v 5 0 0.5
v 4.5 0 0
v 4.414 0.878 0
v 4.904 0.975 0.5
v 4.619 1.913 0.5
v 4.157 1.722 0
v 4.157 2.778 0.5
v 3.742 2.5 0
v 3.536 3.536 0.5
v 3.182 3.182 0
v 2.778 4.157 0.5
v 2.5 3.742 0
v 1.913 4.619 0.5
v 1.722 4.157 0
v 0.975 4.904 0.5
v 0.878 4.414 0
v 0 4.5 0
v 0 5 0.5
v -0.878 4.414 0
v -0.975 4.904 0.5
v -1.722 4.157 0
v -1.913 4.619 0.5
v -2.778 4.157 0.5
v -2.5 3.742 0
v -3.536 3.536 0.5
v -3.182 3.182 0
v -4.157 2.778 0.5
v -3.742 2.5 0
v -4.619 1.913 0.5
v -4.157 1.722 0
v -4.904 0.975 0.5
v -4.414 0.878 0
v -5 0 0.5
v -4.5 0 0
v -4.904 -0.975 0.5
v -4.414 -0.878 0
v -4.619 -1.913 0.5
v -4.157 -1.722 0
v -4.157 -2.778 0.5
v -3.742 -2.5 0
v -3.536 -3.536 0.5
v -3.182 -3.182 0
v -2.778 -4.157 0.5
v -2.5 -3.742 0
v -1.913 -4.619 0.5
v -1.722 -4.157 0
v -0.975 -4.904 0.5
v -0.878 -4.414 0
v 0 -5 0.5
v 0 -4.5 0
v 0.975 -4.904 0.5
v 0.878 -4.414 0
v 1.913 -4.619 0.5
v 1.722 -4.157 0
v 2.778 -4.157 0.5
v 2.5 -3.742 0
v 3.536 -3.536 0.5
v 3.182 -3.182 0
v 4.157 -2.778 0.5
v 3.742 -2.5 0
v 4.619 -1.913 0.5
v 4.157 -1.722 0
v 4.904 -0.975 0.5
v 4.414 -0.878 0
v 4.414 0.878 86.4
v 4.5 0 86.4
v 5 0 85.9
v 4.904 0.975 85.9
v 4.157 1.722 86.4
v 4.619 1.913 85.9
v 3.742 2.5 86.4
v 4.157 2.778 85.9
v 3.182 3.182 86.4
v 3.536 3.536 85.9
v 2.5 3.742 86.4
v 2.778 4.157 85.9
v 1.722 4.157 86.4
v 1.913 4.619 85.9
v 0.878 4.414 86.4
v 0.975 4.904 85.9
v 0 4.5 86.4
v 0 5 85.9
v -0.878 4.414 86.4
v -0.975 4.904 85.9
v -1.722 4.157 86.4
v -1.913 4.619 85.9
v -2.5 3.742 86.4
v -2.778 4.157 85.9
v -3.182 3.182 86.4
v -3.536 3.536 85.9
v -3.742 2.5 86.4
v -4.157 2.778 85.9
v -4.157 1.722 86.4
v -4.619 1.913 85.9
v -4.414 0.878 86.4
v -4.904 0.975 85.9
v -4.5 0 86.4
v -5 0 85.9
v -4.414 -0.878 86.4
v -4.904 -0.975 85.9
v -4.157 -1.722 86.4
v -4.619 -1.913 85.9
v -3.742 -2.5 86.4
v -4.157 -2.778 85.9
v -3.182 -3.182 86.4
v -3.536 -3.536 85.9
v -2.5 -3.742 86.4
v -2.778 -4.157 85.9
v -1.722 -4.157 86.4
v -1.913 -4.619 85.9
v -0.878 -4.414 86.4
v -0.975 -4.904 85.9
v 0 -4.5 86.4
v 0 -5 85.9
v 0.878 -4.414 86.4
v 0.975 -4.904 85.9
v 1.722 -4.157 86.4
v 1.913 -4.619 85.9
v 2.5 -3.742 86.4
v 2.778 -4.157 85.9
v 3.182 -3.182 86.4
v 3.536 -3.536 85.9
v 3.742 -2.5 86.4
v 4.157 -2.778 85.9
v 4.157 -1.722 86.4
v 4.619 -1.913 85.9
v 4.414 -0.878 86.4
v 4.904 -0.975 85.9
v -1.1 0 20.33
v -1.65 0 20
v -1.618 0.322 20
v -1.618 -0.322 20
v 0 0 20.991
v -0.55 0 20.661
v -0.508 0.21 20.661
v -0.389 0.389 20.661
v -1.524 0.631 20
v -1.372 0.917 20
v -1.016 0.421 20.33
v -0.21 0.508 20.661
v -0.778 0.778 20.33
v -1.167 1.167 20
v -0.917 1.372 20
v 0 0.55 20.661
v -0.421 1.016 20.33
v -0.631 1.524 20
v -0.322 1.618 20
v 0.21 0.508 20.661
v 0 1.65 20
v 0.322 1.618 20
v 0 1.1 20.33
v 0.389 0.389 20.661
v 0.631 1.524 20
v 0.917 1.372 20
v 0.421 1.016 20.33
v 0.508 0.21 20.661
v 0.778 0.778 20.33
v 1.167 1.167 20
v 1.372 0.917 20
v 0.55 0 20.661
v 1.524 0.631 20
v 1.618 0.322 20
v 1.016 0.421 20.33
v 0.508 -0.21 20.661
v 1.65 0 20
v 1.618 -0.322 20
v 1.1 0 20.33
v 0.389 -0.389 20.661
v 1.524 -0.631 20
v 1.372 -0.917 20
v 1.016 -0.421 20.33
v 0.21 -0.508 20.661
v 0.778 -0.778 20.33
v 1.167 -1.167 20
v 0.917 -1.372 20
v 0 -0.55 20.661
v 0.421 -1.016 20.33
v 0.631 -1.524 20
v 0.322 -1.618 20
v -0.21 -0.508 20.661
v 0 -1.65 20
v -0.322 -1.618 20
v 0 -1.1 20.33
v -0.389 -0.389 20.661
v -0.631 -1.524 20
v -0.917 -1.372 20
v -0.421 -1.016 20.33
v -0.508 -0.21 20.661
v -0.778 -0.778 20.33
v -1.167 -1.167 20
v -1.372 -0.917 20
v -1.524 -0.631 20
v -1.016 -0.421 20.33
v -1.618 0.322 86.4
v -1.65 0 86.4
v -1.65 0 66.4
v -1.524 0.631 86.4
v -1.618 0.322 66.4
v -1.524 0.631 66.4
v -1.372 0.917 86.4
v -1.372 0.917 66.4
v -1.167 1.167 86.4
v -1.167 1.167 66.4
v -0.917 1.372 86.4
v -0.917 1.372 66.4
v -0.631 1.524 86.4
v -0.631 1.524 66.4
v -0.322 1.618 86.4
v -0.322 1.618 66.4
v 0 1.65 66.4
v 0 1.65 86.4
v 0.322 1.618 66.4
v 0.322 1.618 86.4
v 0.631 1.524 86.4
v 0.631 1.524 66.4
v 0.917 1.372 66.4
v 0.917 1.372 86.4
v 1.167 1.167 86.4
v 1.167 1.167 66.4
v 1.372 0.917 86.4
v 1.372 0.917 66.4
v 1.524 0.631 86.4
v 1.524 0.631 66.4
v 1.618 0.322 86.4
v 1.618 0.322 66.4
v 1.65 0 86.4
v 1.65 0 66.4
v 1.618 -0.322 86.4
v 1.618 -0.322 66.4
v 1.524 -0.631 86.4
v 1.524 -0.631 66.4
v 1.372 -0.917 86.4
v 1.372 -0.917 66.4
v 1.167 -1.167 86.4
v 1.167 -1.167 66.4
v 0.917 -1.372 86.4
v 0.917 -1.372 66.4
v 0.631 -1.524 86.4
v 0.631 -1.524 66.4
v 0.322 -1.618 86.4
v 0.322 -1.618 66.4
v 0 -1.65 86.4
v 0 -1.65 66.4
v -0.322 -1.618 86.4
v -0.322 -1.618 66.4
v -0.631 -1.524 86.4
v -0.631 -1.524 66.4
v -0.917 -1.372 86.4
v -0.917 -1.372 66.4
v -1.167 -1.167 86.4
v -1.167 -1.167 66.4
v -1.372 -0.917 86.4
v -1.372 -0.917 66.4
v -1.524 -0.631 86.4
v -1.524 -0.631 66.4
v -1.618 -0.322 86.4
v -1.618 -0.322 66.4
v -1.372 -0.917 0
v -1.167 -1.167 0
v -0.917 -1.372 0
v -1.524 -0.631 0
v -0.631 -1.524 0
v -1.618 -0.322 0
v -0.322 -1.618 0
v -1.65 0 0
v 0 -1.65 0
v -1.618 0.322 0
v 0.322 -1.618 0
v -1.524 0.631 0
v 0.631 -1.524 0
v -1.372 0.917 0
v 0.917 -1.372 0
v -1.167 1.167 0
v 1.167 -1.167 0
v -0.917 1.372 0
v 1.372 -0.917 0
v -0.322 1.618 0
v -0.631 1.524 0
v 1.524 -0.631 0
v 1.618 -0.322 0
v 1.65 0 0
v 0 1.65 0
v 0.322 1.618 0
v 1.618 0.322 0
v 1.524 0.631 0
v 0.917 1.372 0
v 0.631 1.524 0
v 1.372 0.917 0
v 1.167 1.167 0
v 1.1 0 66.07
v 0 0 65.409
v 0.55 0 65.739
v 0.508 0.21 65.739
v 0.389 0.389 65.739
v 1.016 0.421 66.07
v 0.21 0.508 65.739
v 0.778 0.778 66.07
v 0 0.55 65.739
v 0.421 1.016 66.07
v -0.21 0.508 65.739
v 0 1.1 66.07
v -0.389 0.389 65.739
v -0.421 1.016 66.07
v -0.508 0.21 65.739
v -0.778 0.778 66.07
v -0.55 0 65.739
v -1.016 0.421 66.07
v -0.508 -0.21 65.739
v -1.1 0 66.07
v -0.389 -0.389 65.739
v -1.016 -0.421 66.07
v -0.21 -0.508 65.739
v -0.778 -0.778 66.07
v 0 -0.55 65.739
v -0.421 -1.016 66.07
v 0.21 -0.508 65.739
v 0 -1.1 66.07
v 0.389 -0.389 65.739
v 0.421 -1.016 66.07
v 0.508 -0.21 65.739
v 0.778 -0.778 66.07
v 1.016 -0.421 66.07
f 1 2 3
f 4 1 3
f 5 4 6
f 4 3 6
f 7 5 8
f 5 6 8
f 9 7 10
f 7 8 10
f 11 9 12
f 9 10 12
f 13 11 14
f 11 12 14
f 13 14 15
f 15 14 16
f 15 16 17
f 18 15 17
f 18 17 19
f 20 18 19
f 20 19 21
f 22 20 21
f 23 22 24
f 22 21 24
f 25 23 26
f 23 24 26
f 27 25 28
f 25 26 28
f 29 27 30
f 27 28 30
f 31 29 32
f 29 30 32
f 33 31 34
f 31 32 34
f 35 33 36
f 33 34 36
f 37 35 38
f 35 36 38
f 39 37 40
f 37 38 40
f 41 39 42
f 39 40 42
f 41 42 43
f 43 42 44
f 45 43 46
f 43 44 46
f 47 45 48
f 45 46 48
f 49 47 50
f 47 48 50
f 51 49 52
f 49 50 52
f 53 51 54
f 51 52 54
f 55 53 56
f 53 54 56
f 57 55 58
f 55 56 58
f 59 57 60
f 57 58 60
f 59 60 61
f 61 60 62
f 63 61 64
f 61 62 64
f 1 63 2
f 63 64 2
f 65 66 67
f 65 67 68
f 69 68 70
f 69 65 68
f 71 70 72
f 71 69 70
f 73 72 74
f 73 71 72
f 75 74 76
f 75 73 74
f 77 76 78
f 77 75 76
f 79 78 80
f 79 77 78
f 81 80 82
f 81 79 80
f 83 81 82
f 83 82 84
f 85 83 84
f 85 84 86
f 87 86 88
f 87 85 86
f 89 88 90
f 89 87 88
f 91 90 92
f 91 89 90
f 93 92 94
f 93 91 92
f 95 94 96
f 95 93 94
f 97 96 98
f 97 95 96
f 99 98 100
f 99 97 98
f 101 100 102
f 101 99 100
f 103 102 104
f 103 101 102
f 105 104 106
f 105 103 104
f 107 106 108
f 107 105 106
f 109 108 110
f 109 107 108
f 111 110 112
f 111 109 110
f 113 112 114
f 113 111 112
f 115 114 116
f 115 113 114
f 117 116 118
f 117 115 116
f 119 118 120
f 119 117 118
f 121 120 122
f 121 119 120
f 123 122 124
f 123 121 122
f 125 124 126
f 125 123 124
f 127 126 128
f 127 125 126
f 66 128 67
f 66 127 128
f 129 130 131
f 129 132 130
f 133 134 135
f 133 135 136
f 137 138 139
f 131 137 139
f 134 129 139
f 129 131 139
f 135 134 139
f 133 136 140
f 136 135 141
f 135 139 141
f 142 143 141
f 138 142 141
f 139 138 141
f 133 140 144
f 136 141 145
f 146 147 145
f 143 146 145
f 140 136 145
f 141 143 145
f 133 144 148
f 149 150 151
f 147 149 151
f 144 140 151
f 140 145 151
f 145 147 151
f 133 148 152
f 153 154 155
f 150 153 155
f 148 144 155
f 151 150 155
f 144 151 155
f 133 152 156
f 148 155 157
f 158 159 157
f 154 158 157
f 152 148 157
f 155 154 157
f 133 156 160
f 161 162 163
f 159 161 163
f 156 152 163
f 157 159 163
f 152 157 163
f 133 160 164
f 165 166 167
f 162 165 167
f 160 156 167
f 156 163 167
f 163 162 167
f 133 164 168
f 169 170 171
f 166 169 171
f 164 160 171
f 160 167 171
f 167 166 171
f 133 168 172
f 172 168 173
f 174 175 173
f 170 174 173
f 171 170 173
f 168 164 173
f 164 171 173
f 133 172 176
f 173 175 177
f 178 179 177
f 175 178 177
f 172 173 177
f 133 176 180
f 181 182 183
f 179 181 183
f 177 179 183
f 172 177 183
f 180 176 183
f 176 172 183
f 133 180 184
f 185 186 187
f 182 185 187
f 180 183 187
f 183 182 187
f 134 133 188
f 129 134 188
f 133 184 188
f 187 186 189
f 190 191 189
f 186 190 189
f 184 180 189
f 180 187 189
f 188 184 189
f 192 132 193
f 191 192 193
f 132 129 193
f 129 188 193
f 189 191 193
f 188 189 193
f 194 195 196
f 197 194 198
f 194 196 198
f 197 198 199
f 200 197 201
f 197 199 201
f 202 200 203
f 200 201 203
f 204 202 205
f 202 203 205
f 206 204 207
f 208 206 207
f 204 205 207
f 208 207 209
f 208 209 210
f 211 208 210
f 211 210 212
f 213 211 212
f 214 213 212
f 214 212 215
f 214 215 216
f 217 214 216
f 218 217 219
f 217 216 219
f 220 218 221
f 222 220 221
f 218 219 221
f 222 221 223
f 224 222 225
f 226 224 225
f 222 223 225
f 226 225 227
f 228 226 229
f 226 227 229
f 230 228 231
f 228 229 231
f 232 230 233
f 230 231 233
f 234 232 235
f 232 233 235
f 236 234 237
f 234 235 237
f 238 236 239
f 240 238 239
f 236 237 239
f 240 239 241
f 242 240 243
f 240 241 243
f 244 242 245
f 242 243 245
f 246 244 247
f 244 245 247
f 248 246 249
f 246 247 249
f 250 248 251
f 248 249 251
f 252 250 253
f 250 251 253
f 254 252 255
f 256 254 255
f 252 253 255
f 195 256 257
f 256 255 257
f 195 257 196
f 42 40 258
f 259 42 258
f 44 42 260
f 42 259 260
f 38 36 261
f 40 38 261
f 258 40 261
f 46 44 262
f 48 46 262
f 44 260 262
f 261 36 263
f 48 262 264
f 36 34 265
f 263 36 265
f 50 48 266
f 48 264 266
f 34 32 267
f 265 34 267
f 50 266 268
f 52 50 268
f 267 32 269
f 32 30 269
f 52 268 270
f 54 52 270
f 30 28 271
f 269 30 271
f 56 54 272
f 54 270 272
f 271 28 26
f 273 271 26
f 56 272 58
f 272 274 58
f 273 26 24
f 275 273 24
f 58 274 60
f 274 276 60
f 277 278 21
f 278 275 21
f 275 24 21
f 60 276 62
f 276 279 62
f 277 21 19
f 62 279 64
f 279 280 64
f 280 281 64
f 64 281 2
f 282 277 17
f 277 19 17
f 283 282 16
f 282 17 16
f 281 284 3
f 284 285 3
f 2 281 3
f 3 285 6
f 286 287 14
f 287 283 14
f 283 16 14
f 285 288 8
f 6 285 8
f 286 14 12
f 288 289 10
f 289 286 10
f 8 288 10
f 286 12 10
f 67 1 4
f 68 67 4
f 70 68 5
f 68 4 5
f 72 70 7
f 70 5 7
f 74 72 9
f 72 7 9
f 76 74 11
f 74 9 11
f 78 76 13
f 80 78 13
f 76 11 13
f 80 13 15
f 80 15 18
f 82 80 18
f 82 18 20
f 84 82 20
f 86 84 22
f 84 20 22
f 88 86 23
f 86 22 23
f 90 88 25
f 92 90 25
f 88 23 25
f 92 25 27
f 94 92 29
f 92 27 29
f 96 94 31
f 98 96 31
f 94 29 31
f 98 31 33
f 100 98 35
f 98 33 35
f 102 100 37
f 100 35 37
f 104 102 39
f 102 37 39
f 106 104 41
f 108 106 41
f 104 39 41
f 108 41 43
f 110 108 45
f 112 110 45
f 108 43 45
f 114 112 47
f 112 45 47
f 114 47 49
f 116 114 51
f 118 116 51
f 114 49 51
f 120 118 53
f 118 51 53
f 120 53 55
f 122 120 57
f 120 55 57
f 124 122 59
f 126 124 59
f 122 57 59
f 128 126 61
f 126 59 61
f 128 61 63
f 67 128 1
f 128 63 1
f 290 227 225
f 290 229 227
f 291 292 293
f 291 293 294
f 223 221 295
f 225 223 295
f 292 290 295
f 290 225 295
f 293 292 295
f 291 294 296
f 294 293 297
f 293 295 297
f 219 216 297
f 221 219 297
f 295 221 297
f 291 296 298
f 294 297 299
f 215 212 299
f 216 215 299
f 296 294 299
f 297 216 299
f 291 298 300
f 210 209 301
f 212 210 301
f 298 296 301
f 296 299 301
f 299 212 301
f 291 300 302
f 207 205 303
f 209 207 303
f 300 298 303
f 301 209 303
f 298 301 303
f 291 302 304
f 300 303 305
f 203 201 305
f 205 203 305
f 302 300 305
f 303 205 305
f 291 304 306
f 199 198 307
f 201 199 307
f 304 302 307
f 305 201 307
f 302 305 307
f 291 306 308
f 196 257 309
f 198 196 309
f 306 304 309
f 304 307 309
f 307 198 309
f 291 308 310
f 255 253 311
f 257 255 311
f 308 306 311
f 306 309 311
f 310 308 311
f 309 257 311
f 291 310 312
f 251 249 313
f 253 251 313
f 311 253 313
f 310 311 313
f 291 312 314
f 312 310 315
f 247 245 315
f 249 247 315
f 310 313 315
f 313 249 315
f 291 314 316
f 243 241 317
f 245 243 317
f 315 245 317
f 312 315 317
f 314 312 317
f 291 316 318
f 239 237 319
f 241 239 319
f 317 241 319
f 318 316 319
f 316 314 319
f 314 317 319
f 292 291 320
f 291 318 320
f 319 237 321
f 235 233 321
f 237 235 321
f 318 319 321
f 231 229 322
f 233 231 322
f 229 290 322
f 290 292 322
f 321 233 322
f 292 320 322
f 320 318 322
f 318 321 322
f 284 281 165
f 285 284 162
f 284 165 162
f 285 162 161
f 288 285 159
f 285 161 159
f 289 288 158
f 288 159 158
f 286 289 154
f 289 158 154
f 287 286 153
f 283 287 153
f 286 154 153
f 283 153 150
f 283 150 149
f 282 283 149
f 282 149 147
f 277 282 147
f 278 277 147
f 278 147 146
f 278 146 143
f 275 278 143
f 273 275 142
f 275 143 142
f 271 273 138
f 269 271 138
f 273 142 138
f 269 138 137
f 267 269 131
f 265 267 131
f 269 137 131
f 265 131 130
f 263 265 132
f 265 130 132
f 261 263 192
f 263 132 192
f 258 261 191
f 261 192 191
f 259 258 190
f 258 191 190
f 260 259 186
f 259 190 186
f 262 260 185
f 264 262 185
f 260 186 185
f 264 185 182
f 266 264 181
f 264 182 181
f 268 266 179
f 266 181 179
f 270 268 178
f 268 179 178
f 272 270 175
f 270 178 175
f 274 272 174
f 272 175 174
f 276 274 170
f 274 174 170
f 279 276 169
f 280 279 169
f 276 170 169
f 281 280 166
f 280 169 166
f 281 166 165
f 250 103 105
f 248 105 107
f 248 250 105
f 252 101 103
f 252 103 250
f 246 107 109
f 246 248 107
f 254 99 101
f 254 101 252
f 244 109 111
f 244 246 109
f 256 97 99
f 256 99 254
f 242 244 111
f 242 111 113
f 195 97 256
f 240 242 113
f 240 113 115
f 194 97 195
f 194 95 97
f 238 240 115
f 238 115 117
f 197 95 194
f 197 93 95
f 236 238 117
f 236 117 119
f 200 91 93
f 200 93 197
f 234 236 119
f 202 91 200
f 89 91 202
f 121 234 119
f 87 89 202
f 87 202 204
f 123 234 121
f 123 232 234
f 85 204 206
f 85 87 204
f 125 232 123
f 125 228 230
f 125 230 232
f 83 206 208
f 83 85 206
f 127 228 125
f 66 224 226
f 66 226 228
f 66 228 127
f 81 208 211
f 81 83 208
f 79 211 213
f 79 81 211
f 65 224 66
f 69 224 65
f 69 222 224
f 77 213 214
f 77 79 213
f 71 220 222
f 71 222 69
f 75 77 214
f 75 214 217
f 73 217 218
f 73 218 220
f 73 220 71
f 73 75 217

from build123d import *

# Parameters (mm, degrees)
ESQUISSE1_R               = 5
BOSS_EXTRU_1_DEPTH        = 86.4
TROU_TARAUD_M4X0_71_D     = 3.3
TROU_TARAUD_M4X0_71_DEPTH = 20
TROU_TARAUD_M4X0_71_TIP   = 0.991420021
TROU_TARAUD_M4X0_72_D     = 3.3
TROU_TARAUD_M4X0_72_DEPTH = 20
TROU_TARAUD_M4X0_72_TIP   = 0.991420021
CHANFREIN1_SIZE           = 0.5


with BuildPart() as part:
    # Esquisse1 → Boss.-Extru.1 (new body)
    with BuildSketch(Plane.XY):
        Circle(ESQUISSE1_R)
    extrude(amount=BOSS_EXTRU_1_DEPTH)

    # Trou taraudé M4x0.71
    with Locations(Plane.XY.offset(86.4)):
        with Locations((0, 0)):
            Hole(TROU_TARAUD_M4X0_71_D / 2, depth=TROU_TARAUD_M4X0_71_DEPTH)
            with Locations((0, 0, -(TROU_TARAUD_M4X0_71_DEPTH + TROU_TARAUD_M4X0_71_TIP / 2))):  # 118° drill point
                Cone(0, TROU_TARAUD_M4X0_71_D / 2, TROU_TARAUD_M4X0_71_TIP, mode=Mode.SUBTRACT)

    # Trou taraudé M4x0.72
    with Locations(Plane(origin=(0, 0, 0), x_dir=(-1, 0, 0), z_dir=(0, 0, -1))):
        with Locations((0, 0)):
            Hole(TROU_TARAUD_M4X0_72_D / 2, depth=TROU_TARAUD_M4X0_72_DEPTH)
            with Locations((0, 0, -(TROU_TARAUD_M4X0_72_DEPTH + TROU_TARAUD_M4X0_72_TIP / 2))):  # 118° drill point
                Cone(0, TROU_TARAUD_M4X0_72_D / 2, TROU_TARAUD_M4X0_72_TIP, mode=Mode.SUBTRACT)

    # Chanfrein1
    chanfrein1_edges = [part.edges().sort_by_distance(p)[0] for p in [
        (-5, 0, 0),
        (-5, 0, 86.4),
    ]]
    chamfer(chanfrein1_edges, length=CHANFREIN1_SIZE)


solid = part.part
